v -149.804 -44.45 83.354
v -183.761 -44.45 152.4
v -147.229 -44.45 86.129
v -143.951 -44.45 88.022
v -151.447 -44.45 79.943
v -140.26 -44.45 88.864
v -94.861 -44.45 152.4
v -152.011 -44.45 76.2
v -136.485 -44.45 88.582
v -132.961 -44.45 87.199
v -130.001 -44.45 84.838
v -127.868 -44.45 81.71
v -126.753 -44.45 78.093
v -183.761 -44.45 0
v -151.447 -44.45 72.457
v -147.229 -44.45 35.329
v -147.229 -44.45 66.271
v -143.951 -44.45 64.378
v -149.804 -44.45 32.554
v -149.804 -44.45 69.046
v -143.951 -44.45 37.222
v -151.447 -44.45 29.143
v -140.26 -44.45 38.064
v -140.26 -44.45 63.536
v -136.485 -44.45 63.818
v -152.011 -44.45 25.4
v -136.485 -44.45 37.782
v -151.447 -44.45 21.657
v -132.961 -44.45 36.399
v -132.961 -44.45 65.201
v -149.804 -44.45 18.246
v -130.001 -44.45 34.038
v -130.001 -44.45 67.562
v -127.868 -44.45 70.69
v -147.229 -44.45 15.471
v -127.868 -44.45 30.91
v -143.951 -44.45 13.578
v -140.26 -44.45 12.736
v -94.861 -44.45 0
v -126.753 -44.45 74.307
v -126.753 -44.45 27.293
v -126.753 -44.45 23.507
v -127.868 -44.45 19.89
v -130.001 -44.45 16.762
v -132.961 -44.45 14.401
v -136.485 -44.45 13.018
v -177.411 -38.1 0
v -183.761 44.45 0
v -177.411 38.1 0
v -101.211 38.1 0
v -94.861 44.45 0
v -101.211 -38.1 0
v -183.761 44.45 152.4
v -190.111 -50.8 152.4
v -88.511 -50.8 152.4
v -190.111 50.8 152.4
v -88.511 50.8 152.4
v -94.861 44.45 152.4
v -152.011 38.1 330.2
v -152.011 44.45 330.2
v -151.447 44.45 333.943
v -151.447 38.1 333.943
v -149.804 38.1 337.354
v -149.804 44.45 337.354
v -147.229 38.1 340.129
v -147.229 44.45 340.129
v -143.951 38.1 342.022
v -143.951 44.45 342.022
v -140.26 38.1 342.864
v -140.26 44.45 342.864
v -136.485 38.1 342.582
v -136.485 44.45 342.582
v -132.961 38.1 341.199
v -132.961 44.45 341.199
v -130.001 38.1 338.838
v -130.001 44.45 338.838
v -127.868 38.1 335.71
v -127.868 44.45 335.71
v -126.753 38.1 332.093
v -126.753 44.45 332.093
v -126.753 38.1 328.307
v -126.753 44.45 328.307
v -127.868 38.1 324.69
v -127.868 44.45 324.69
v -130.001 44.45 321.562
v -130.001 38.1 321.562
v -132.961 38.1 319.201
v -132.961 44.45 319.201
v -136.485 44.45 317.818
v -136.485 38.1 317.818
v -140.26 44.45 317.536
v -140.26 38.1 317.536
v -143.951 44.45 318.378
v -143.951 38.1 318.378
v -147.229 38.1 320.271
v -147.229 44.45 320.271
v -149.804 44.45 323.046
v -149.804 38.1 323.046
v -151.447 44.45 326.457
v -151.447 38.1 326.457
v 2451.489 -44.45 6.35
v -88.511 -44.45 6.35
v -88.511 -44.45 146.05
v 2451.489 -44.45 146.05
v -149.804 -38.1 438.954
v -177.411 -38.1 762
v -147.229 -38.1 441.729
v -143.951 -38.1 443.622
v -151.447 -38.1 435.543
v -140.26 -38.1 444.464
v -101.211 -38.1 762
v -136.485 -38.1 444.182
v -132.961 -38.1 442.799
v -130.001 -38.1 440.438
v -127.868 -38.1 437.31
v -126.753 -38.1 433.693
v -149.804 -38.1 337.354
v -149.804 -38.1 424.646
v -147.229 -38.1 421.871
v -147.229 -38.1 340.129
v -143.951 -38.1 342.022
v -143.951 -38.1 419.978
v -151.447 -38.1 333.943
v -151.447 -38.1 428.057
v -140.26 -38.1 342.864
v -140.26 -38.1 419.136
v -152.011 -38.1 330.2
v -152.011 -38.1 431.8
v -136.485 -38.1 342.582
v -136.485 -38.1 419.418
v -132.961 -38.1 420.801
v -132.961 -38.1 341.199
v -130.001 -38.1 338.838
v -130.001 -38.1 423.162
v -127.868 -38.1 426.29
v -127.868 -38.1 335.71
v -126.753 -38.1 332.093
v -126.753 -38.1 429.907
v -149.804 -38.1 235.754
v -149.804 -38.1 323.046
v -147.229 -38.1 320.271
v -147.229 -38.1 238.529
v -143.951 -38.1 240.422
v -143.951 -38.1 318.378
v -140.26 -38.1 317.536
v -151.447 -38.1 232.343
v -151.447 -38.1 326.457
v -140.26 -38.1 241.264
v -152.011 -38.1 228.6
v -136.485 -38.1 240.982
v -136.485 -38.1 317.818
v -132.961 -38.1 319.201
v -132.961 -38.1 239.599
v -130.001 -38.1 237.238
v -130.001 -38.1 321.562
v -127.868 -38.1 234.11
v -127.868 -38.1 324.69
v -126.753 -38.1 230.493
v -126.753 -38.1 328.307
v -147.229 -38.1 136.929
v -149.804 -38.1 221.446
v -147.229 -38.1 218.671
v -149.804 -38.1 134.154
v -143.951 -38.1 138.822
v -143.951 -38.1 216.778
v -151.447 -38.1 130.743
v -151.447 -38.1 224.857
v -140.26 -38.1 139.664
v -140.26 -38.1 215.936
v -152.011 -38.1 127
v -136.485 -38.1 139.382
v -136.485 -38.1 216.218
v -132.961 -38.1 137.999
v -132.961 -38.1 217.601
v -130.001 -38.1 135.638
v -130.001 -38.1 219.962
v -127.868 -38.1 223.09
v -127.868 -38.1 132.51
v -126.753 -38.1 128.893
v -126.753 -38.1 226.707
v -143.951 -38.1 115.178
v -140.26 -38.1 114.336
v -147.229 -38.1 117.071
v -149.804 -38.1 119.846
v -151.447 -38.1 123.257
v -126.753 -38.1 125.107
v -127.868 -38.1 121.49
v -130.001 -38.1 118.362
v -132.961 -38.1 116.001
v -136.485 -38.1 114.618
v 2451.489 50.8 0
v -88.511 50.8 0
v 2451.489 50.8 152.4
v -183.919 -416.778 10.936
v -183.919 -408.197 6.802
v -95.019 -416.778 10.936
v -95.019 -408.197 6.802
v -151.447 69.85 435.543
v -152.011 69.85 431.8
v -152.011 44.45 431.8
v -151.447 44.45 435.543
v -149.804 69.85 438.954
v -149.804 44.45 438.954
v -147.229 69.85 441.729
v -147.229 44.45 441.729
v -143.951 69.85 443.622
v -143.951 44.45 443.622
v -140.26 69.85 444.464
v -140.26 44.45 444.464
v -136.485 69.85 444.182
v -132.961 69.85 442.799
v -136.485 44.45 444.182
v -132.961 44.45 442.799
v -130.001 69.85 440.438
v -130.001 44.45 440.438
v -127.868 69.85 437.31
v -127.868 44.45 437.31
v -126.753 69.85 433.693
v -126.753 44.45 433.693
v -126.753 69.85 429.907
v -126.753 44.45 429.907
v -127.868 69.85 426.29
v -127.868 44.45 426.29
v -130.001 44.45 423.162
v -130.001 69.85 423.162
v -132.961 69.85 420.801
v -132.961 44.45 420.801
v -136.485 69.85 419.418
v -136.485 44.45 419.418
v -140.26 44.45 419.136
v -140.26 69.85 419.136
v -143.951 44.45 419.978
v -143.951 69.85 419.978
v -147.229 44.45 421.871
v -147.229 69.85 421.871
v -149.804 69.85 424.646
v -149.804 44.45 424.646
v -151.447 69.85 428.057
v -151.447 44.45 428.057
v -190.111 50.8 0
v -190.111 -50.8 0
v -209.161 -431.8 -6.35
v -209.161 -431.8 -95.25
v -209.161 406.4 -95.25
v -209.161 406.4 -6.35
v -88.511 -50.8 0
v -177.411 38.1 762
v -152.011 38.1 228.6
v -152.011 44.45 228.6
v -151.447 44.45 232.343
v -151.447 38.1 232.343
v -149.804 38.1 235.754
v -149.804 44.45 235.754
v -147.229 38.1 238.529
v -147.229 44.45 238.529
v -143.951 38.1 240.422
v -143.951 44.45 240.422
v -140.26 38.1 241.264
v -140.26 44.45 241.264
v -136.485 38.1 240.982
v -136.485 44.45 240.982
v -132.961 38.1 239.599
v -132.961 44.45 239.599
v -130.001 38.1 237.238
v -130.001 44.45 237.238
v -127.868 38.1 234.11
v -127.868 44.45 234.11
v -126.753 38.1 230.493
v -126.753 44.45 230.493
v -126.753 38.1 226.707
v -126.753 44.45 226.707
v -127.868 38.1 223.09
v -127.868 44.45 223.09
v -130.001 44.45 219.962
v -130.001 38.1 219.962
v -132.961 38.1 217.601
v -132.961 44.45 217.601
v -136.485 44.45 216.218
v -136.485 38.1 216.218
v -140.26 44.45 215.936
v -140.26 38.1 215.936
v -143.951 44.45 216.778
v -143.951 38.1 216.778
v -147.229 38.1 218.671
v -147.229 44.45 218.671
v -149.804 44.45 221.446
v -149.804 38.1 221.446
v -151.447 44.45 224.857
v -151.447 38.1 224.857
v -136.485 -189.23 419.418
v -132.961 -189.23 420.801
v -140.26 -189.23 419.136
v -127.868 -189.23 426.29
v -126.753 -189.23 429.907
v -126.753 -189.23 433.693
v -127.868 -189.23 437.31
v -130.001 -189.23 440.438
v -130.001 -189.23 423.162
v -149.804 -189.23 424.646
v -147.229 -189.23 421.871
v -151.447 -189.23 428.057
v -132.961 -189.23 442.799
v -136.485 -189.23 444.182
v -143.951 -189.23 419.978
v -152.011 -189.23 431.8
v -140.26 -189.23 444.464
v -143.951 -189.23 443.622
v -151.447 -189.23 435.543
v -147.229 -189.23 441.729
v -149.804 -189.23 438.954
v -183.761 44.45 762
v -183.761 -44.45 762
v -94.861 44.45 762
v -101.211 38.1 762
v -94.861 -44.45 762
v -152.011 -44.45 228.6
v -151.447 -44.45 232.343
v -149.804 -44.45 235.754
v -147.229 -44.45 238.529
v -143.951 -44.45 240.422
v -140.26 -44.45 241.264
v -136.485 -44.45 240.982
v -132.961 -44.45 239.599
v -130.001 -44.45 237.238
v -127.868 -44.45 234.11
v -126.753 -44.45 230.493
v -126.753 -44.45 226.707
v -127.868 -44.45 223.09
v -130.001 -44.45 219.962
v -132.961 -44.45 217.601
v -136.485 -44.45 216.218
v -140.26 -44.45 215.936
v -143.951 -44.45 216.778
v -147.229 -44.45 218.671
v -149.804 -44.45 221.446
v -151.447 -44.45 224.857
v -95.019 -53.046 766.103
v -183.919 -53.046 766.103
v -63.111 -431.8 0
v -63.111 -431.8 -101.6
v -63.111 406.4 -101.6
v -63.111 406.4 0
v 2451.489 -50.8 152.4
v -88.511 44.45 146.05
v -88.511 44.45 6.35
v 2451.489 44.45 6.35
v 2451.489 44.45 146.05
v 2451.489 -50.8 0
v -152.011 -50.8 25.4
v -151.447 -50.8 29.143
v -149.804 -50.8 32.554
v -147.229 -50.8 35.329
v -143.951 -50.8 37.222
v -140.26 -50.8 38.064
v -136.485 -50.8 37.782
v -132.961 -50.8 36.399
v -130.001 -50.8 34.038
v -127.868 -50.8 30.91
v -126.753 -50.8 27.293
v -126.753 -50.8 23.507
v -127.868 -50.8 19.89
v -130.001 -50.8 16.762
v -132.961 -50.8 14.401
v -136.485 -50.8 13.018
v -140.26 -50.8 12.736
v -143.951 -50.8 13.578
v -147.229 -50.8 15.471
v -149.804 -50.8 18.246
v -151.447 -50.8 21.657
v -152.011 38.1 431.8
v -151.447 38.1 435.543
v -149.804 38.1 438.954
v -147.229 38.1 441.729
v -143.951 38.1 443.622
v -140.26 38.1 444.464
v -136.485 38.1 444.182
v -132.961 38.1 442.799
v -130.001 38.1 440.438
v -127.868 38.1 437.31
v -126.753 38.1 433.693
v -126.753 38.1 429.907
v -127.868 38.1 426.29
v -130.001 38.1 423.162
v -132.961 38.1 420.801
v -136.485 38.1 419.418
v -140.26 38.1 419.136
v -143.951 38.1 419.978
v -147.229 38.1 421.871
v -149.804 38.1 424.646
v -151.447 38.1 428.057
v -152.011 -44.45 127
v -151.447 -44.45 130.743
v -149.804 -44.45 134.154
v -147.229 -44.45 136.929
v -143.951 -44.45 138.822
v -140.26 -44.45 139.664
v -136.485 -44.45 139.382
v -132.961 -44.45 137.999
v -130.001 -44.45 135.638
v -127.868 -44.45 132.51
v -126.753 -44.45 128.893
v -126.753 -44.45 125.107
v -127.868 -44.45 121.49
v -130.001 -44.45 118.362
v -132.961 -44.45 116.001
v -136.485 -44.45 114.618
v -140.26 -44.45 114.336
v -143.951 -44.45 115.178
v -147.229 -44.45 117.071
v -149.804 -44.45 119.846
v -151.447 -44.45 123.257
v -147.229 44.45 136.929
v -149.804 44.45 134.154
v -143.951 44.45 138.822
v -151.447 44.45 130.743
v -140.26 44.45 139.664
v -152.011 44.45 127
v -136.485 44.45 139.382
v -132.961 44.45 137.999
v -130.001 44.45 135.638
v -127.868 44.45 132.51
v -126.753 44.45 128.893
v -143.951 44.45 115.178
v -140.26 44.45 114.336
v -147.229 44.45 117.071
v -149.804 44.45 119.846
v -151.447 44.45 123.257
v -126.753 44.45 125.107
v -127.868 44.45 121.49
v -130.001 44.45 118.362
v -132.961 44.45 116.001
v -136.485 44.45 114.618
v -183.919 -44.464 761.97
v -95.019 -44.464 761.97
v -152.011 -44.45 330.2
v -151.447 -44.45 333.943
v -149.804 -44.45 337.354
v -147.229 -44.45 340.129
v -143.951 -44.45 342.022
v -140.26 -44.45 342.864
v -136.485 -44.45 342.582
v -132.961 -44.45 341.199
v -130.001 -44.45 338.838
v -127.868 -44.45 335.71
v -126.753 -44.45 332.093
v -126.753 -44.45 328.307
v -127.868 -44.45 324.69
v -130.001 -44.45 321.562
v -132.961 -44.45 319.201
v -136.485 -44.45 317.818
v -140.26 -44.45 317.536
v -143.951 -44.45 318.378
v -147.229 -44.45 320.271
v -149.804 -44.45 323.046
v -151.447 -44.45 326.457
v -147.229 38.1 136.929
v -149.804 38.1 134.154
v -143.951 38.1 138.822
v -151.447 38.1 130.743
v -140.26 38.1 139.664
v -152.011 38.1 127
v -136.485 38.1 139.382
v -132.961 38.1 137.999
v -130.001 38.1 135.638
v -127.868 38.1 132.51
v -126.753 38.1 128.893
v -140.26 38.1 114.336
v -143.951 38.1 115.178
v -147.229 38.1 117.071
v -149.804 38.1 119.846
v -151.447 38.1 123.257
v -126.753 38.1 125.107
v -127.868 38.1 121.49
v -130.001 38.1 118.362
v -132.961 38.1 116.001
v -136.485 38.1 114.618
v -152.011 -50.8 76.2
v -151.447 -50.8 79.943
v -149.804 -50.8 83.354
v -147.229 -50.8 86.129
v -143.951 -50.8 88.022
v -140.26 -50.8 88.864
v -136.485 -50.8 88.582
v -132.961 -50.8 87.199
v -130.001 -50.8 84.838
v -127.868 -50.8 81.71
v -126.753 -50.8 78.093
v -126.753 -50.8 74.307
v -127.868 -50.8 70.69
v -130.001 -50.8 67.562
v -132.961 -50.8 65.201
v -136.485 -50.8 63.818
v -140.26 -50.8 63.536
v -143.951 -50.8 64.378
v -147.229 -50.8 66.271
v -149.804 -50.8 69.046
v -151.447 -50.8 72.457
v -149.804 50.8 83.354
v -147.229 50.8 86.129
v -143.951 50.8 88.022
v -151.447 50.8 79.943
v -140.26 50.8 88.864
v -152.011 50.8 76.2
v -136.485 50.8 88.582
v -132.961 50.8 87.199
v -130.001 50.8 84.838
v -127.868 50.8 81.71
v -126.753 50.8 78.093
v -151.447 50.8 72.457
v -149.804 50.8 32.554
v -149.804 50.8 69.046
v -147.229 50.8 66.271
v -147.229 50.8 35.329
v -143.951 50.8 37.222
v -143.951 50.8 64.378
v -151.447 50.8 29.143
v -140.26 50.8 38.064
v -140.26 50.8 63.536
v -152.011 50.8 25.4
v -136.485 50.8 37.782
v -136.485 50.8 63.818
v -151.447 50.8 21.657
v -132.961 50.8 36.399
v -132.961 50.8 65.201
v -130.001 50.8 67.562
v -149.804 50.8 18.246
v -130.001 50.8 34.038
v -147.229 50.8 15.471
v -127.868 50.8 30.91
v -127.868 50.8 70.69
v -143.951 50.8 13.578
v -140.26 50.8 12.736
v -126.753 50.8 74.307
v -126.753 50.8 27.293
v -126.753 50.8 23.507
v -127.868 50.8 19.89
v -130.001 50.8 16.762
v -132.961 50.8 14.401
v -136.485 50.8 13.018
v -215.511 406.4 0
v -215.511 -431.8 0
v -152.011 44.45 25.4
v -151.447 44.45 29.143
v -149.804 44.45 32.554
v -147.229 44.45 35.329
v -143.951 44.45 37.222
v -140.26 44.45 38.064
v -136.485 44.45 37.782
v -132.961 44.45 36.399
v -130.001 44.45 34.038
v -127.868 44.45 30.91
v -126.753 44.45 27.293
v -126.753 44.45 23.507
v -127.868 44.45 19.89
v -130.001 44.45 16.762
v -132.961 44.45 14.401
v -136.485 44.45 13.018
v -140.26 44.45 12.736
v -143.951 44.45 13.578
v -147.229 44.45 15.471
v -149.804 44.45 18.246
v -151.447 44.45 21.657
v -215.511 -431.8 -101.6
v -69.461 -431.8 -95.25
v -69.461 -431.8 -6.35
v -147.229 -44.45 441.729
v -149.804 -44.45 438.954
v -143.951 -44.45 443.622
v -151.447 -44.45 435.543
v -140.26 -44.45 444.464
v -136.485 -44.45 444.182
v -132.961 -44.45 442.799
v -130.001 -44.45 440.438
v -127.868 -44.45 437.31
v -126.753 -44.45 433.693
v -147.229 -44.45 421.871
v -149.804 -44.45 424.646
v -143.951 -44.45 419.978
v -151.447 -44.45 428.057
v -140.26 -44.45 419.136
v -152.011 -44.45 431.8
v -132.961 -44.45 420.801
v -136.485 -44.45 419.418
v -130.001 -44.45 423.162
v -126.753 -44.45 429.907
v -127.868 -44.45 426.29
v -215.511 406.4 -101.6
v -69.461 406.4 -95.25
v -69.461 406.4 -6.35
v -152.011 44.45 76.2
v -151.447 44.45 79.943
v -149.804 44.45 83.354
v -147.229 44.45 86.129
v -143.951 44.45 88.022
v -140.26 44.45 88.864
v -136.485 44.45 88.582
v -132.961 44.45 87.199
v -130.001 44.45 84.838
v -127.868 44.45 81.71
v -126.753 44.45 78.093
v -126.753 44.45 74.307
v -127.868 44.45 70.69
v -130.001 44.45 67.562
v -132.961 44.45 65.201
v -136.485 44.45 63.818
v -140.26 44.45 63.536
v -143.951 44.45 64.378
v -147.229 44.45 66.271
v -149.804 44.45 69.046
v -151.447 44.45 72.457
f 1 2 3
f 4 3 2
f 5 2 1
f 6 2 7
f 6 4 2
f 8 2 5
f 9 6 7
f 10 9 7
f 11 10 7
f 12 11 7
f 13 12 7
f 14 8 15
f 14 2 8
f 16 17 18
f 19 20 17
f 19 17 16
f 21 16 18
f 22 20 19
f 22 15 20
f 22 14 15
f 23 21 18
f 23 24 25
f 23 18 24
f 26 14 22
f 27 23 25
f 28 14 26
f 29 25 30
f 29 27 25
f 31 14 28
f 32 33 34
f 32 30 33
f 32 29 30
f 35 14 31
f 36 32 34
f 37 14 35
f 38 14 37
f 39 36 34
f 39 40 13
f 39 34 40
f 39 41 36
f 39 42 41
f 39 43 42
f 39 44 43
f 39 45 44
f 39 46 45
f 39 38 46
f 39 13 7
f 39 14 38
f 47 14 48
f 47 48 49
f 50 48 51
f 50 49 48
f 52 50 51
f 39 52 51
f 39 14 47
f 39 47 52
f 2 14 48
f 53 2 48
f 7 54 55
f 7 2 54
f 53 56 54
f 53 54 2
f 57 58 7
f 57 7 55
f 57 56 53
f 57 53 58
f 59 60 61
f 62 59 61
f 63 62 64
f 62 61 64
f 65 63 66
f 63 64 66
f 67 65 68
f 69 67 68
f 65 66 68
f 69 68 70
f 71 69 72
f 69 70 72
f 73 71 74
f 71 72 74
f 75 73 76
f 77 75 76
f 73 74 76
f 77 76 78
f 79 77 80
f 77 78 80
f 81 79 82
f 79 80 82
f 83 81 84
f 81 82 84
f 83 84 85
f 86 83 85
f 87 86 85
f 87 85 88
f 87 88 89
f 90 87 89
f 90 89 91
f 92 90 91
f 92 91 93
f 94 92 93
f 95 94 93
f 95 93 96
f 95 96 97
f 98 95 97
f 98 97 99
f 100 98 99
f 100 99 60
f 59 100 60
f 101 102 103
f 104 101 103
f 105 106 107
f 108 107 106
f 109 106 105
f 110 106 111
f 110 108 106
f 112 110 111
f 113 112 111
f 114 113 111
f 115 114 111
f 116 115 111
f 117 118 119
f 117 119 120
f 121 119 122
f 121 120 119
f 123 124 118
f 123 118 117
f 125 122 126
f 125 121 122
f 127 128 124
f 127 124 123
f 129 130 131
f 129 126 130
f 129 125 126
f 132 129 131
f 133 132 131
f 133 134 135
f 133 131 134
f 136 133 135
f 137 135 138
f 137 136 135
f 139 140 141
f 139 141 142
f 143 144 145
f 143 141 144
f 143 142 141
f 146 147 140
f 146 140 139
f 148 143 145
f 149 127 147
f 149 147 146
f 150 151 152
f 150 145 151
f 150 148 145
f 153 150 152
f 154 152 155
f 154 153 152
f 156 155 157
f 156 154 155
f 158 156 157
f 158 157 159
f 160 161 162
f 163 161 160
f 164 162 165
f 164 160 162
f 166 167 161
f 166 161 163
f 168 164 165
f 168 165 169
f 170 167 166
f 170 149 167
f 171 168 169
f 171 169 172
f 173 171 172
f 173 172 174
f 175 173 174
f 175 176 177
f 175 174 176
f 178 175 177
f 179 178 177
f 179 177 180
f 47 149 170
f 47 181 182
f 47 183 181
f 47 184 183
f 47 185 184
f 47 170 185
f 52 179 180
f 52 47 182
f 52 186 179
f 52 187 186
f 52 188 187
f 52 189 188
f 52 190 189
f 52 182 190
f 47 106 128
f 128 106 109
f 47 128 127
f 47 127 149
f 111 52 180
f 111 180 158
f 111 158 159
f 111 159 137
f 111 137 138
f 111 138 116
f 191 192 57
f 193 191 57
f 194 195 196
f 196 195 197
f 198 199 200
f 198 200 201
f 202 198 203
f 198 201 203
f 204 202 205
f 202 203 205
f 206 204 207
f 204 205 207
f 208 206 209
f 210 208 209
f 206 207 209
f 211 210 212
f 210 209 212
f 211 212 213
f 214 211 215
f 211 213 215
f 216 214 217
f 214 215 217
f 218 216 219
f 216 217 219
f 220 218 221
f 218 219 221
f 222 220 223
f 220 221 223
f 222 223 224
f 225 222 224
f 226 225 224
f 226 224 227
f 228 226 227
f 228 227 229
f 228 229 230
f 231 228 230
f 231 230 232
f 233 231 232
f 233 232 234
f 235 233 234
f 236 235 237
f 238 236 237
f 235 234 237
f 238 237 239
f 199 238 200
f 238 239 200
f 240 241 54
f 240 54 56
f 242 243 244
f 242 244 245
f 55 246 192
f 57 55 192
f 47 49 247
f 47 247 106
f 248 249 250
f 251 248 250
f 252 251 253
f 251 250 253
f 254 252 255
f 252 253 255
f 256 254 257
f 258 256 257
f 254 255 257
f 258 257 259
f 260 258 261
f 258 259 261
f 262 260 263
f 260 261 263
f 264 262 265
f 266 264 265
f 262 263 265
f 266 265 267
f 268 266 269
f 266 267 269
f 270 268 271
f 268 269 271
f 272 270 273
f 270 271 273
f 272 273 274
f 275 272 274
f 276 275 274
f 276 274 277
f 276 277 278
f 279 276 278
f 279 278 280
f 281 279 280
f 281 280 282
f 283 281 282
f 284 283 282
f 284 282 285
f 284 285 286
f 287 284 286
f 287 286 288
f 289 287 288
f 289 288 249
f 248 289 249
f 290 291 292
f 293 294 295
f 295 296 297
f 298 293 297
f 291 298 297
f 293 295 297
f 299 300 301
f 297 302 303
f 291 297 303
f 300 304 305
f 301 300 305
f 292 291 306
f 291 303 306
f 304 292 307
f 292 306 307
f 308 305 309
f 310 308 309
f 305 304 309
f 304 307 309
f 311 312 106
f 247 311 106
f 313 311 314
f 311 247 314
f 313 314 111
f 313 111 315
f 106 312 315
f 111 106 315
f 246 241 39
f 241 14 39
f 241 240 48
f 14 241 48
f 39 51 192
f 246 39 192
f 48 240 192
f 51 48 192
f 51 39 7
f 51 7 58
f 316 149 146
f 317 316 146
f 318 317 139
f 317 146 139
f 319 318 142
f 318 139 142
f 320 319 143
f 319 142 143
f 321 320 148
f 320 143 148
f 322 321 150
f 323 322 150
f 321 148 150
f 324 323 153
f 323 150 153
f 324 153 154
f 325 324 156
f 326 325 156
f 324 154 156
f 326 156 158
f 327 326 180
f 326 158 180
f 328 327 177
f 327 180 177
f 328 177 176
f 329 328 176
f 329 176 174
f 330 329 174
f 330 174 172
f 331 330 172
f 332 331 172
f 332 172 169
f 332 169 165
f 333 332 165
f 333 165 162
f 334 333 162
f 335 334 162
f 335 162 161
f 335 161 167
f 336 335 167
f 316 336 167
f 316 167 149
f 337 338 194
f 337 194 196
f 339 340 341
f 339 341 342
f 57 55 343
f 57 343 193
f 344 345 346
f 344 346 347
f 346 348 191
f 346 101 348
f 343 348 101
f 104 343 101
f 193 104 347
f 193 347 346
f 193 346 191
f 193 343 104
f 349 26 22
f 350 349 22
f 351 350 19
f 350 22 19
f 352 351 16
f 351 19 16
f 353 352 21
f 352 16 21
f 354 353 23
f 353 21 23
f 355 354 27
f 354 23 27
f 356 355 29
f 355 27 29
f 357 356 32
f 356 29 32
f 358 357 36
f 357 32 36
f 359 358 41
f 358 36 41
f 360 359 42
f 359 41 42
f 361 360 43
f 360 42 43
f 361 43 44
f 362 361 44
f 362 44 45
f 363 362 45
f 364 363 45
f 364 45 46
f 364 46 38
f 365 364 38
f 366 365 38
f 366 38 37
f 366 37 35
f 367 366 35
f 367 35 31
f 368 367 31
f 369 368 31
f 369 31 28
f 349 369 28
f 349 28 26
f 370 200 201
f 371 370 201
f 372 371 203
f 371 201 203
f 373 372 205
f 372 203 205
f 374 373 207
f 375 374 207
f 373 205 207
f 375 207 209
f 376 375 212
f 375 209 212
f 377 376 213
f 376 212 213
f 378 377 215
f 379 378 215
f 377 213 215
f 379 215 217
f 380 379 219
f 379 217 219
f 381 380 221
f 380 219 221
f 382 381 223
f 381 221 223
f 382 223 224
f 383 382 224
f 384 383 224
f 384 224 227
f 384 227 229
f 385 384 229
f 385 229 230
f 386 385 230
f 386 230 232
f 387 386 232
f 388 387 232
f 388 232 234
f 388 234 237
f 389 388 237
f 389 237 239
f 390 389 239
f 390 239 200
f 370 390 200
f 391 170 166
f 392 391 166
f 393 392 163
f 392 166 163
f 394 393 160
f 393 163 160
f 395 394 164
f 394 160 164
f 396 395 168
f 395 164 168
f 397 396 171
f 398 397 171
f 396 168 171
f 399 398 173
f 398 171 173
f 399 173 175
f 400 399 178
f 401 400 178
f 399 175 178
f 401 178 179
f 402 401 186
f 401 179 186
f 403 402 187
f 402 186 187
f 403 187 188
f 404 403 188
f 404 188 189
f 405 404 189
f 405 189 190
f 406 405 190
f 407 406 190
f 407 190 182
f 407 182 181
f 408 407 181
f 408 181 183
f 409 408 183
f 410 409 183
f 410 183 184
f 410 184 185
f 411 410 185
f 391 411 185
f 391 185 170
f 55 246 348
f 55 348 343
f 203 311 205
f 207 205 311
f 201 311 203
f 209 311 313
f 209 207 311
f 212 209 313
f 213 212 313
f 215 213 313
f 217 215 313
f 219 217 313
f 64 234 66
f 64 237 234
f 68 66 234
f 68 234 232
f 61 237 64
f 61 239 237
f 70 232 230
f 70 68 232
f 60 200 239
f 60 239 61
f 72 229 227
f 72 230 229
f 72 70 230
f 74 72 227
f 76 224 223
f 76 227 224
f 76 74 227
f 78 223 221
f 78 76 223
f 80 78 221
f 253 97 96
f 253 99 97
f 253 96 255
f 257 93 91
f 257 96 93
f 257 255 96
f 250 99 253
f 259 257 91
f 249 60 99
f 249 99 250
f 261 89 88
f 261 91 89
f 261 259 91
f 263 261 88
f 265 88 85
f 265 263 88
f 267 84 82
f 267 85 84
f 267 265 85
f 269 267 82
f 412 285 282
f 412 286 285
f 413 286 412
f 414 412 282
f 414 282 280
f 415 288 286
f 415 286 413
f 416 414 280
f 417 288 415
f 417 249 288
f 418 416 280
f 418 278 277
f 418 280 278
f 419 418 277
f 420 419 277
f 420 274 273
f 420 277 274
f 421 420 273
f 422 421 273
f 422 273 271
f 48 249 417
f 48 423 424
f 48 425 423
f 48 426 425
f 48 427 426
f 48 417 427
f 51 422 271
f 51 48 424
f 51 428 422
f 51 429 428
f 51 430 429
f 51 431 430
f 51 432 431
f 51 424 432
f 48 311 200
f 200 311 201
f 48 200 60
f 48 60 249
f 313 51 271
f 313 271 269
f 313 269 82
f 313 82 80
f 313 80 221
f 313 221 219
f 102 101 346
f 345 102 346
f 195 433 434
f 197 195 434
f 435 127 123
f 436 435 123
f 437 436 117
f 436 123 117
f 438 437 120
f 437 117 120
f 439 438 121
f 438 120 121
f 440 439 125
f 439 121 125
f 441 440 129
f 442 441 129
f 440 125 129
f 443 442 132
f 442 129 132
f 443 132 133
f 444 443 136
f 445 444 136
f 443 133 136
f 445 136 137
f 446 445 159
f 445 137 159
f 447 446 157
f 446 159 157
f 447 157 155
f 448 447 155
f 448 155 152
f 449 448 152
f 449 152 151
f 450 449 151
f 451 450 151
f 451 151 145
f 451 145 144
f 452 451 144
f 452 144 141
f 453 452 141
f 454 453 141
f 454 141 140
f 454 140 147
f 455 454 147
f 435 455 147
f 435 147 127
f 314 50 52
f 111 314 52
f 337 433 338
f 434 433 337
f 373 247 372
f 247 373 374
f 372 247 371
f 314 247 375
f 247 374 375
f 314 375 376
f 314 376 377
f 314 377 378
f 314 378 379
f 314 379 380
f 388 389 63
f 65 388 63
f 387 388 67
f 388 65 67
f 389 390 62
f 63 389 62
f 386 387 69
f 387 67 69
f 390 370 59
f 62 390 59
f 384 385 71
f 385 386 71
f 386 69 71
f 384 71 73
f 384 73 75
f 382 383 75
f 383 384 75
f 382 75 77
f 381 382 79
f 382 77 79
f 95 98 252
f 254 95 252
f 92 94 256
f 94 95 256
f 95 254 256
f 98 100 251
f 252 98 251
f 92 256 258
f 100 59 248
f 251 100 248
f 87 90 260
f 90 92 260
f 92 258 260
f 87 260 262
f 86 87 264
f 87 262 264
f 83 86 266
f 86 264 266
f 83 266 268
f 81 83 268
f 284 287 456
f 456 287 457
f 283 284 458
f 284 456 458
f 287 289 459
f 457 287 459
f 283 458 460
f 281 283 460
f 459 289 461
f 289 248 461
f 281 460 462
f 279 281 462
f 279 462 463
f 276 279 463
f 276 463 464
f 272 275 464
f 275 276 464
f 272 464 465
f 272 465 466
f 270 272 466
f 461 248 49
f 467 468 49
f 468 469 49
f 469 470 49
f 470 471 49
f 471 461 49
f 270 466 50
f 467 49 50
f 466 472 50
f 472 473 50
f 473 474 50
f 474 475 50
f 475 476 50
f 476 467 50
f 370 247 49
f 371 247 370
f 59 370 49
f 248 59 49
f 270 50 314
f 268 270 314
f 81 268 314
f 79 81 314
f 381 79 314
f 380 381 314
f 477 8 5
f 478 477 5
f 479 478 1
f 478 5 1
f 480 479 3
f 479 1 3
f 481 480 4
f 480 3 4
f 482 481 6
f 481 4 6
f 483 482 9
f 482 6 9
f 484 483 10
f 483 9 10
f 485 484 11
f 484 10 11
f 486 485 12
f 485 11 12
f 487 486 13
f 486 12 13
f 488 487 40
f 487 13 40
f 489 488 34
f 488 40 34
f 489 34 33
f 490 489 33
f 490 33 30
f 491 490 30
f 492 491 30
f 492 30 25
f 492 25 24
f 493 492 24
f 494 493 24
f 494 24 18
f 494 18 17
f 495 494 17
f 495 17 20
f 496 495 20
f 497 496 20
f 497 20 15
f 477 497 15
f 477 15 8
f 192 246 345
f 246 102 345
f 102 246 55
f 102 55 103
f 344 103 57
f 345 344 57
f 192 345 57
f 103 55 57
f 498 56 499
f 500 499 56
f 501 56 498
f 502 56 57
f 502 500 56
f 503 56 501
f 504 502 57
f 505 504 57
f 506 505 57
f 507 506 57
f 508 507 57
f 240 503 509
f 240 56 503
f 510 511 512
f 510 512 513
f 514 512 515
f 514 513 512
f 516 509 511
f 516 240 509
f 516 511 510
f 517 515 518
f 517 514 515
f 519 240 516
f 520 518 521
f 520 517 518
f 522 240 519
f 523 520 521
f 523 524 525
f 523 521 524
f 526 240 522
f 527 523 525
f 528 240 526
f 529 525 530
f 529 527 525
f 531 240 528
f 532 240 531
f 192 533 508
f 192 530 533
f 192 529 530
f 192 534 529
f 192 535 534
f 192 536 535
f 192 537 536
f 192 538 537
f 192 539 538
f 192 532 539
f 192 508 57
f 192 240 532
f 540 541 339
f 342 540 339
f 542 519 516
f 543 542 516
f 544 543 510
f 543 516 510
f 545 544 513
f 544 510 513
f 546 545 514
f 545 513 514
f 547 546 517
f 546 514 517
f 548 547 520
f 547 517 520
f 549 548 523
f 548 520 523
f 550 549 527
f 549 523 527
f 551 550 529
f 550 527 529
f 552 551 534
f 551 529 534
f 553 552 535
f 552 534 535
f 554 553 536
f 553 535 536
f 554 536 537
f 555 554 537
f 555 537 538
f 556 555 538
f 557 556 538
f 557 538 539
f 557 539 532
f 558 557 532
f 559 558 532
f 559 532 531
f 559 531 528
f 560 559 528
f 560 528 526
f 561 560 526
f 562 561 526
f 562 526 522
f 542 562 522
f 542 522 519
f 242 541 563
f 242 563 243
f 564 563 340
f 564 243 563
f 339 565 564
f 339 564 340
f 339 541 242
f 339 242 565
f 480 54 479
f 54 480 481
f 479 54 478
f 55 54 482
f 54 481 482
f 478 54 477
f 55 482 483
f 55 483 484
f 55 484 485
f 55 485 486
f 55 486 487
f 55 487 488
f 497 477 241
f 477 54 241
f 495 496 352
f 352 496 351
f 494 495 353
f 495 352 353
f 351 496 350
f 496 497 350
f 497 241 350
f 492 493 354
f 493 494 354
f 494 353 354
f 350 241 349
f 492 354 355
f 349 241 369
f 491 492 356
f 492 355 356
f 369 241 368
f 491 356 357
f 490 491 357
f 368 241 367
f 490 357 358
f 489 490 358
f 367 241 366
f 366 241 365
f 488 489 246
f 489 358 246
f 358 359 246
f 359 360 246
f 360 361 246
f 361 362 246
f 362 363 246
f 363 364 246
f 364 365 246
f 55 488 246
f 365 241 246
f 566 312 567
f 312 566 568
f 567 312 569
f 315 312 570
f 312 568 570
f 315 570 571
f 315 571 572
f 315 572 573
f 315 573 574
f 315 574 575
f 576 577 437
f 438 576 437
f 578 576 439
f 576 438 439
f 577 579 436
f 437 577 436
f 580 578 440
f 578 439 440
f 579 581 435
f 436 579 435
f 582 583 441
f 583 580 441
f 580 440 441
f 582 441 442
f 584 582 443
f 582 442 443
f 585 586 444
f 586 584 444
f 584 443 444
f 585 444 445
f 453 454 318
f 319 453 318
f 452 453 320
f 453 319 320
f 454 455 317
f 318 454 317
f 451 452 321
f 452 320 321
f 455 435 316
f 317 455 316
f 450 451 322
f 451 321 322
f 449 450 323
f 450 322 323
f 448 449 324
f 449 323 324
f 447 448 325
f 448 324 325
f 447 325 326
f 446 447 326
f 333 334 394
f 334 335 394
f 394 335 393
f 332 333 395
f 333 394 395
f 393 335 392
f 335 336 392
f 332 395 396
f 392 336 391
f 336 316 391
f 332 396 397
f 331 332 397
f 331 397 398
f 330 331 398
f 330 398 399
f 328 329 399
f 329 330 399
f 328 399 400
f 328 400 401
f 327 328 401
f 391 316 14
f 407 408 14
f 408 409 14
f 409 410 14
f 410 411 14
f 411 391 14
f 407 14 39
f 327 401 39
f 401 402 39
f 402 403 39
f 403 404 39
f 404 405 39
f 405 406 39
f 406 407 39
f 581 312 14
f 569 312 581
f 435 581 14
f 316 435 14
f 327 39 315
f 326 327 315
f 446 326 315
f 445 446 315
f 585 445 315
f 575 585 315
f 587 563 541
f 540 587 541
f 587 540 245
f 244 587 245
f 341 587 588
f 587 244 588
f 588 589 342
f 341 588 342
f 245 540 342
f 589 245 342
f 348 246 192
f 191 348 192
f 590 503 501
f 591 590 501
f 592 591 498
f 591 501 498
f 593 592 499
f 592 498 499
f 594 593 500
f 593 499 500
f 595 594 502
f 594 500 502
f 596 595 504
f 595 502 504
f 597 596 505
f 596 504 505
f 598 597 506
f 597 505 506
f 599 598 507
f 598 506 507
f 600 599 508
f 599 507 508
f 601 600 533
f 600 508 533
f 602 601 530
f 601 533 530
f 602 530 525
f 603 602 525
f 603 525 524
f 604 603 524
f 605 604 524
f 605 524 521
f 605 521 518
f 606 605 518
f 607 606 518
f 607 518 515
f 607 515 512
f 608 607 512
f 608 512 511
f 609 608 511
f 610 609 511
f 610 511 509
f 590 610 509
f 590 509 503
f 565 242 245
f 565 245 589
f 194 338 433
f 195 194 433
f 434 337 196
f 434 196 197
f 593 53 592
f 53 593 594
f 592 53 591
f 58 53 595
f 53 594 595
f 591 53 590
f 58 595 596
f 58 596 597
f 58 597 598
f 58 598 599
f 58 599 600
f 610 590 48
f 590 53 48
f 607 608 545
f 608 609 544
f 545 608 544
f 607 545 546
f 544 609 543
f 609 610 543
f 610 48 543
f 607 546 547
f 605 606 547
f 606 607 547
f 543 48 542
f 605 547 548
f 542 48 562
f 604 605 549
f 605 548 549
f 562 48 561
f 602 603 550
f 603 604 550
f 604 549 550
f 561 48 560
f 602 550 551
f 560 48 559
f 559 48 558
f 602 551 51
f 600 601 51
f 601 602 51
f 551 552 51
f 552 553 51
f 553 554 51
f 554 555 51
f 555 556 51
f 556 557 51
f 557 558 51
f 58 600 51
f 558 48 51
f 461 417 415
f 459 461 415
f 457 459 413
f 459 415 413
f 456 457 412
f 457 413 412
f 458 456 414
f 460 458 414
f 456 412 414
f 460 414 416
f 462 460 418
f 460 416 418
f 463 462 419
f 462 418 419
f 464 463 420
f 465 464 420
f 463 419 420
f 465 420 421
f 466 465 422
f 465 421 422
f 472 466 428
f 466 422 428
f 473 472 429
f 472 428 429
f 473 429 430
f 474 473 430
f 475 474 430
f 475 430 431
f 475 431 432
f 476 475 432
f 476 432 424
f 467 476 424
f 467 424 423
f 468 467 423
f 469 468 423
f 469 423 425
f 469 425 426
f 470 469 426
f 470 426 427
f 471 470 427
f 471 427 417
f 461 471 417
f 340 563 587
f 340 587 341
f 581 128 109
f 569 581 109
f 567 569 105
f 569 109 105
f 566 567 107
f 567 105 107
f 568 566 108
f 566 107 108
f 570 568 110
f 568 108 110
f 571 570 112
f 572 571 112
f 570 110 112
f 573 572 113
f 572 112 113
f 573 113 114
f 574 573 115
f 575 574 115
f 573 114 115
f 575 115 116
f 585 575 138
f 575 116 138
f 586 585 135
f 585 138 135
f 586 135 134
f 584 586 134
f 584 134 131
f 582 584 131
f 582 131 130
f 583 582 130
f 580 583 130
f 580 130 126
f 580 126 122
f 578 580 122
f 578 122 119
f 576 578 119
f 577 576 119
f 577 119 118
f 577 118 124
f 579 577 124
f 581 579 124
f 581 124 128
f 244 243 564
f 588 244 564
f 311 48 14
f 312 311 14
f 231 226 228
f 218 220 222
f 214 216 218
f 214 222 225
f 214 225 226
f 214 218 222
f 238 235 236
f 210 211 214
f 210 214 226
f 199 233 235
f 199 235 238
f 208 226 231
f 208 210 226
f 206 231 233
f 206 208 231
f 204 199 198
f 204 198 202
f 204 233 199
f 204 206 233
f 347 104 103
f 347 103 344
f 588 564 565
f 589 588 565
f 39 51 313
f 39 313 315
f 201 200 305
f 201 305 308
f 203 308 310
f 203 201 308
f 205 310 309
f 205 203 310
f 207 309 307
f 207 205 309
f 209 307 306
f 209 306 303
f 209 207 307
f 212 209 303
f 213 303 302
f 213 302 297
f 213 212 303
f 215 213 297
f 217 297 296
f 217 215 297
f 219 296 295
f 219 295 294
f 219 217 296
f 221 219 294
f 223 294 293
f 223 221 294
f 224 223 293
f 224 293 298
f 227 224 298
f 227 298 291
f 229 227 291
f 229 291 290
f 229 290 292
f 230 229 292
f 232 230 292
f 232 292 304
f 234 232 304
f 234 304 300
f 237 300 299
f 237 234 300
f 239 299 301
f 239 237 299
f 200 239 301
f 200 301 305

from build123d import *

# Parameters (mm, degrees)
F0_W           = 101.6
F0_H           = 101.6
F0_W_2         = 88.8999998569
F0_H_2         = 88.8999998569
F1_DEPTH       = 152.4
F2_W           = 88.8999998569
F2_H           = 88.8999998569
F2_W_2         = 76.1999998569
F2_H_2         = 76.1999998569
F3_DEPTH       = 762
F4_W           = 101.6
F4_H           = 152.4
F4_W_2         = 88.9
F4_H_2         = 139.7
F5_DEPTH       = 2540
F7_W           = 152.4
F7_H           = 101.6
F7_W_2         = 139.6999955177
F7_H_2         = 88.8999955177
F8_DEPTH       = 838.2
F12_W          = 88.9
F12_H          = 9.525
F13_DEPTH      = 838.2
F14_R          = 12.7
F15_DEPTH      = 482.601
F16_R          = 12.7
F17_DEPTH      = 476.2509999285
F18_DEPTH      = 233.68
F18_DEPTH_BACK = 25.4
F19_R          = 12.7
F20_DEPTH      = 482.601


with BuildPart() as f1:
    # F0 (on Top) → F1 (new body)
    with BuildSketch(Plane.XY):
        with Locations((-139.3107622862, 0)):
            Rectangle(F0_W, F0_H)
        with Locations((-139.3107622862, 0)):
            Rectangle(F0_W_2, F0_H_2, mode=Mode.SUBTRACT)
    extrude(amount=F1_DEPTH)

    # F14 (on face) → F15 (cut, through all)
    with BuildSketch(Plane(origin=(0, 50.8, 0), x_dir=(-1, 0, 0), z_dir=(0, 1, 0))):
        with Locations((139.3107622862, 25.4)):
            Circle(F14_R)
    extrude(amount=-F15_DEPTH, mode=Mode.SUBTRACT)

    # F19 (on face) → F20 (cut, through all)
    with BuildSketch(Plane(origin=(0, 50.8, 0), x_dir=(-1, 0, 0), z_dir=(0, 1, 0))):
        with Locations((139.3107622862, 76.2)):
            Circle(F19_R)
    extrude(amount=-F20_DEPTH, mode=Mode.SUBTRACT)


with BuildPart() as f3:
    # F2 (on face) → F3 (new body)
    with BuildSketch(Plane(origin=(0, 0, 0), x_dir=(1, 0, 0), z_dir=(0, 0, -1))):
        with Locations((-139.3107622862, 0)):
            Rectangle(F2_W, F2_H)
        with Locations((-139.3107622862, 0)):
            Rectangle(F2_W_2, F2_H_2, mode=Mode.SUBTRACT)
    extrude(amount=-F3_DEPTH)

    # F16 (on face) → F17 (cut, through all)
    with BuildSketch(Plane(origin=(0, 44.4499999285, 0), x_dir=(-1, 0, 0), z_dir=(0, 1, 0))):
        with Locations((139.3107622862, 431.8)):
            Circle(F16_R)
        with Locations((139.3107622862, 330.2)):
            Circle(F16_R)
        with Locations((139.3107622862, 228.6)):
            Circle(F16_R)
        with Locations((139.3107622862, 127)):
            Circle(F16_R)
    extrude(amount=-F17_DEPTH, mode=Mode.SUBTRACT)


with BuildPart() as f5:
    # F4 (on face) → F5 (new body)
    with BuildSketch(Plane.YZ.offset(-88.5107622862)):
        with Locations((0, 76.2)):
            Rectangle(F4_W, F4_H)
        with Locations((0, 76.2)):
            Rectangle(F4_W_2, F4_H_2, mode=Mode.SUBTRACT)
    extrude(amount=F5_DEPTH)


with BuildPart() as f8:
    # F7 (on offset) → F8 (new body)
    with BuildSketch(Plane.XZ.offset(431.8)):
        with Locations((-139.3107622862, -50.8)):
            Rectangle(F7_W, F7_H)
        with Locations((-139.3107622862, -50.8)):
            Rectangle(F7_W_2, F7_H_2, mode=Mode.SUBTRACT)
    extrude(amount=-F8_DEPTH)


with BuildPart() as f13:
    # F12 (on face) → F13 (new body)
    with BuildSketch(Plane(origin=(0, 289.5250416317, 601.1014136742), x_dir=(1, 0, 0), z_dir=(0, 0.4339443975, 0.9009396539))):
        with Locations((-139.4686400175, -375.4748984393)):
            Rectangle(F12_W, F12_H)
    extrude(amount=-F13_DEPTH)


with BuildPart() as f18:
    # F16 (on face) → F18 (new body, two sides)
    with BuildSketch(Plane(origin=(0, 44.4499999285, 0), x_dir=(-1, 0, 0), z_dir=(0, 1, 0))) as f18_sk:
        with Locations((139.3107622862, 431.8)):
            Circle(F16_R)
    extrude(amount=-F18_DEPTH)
    extrude(f18_sk.sketch, amount=F18_DEPTH_BACK)


solid = Compound([f1.part, f3.part, f5.part, f8.part, f13.part, f18.part])
